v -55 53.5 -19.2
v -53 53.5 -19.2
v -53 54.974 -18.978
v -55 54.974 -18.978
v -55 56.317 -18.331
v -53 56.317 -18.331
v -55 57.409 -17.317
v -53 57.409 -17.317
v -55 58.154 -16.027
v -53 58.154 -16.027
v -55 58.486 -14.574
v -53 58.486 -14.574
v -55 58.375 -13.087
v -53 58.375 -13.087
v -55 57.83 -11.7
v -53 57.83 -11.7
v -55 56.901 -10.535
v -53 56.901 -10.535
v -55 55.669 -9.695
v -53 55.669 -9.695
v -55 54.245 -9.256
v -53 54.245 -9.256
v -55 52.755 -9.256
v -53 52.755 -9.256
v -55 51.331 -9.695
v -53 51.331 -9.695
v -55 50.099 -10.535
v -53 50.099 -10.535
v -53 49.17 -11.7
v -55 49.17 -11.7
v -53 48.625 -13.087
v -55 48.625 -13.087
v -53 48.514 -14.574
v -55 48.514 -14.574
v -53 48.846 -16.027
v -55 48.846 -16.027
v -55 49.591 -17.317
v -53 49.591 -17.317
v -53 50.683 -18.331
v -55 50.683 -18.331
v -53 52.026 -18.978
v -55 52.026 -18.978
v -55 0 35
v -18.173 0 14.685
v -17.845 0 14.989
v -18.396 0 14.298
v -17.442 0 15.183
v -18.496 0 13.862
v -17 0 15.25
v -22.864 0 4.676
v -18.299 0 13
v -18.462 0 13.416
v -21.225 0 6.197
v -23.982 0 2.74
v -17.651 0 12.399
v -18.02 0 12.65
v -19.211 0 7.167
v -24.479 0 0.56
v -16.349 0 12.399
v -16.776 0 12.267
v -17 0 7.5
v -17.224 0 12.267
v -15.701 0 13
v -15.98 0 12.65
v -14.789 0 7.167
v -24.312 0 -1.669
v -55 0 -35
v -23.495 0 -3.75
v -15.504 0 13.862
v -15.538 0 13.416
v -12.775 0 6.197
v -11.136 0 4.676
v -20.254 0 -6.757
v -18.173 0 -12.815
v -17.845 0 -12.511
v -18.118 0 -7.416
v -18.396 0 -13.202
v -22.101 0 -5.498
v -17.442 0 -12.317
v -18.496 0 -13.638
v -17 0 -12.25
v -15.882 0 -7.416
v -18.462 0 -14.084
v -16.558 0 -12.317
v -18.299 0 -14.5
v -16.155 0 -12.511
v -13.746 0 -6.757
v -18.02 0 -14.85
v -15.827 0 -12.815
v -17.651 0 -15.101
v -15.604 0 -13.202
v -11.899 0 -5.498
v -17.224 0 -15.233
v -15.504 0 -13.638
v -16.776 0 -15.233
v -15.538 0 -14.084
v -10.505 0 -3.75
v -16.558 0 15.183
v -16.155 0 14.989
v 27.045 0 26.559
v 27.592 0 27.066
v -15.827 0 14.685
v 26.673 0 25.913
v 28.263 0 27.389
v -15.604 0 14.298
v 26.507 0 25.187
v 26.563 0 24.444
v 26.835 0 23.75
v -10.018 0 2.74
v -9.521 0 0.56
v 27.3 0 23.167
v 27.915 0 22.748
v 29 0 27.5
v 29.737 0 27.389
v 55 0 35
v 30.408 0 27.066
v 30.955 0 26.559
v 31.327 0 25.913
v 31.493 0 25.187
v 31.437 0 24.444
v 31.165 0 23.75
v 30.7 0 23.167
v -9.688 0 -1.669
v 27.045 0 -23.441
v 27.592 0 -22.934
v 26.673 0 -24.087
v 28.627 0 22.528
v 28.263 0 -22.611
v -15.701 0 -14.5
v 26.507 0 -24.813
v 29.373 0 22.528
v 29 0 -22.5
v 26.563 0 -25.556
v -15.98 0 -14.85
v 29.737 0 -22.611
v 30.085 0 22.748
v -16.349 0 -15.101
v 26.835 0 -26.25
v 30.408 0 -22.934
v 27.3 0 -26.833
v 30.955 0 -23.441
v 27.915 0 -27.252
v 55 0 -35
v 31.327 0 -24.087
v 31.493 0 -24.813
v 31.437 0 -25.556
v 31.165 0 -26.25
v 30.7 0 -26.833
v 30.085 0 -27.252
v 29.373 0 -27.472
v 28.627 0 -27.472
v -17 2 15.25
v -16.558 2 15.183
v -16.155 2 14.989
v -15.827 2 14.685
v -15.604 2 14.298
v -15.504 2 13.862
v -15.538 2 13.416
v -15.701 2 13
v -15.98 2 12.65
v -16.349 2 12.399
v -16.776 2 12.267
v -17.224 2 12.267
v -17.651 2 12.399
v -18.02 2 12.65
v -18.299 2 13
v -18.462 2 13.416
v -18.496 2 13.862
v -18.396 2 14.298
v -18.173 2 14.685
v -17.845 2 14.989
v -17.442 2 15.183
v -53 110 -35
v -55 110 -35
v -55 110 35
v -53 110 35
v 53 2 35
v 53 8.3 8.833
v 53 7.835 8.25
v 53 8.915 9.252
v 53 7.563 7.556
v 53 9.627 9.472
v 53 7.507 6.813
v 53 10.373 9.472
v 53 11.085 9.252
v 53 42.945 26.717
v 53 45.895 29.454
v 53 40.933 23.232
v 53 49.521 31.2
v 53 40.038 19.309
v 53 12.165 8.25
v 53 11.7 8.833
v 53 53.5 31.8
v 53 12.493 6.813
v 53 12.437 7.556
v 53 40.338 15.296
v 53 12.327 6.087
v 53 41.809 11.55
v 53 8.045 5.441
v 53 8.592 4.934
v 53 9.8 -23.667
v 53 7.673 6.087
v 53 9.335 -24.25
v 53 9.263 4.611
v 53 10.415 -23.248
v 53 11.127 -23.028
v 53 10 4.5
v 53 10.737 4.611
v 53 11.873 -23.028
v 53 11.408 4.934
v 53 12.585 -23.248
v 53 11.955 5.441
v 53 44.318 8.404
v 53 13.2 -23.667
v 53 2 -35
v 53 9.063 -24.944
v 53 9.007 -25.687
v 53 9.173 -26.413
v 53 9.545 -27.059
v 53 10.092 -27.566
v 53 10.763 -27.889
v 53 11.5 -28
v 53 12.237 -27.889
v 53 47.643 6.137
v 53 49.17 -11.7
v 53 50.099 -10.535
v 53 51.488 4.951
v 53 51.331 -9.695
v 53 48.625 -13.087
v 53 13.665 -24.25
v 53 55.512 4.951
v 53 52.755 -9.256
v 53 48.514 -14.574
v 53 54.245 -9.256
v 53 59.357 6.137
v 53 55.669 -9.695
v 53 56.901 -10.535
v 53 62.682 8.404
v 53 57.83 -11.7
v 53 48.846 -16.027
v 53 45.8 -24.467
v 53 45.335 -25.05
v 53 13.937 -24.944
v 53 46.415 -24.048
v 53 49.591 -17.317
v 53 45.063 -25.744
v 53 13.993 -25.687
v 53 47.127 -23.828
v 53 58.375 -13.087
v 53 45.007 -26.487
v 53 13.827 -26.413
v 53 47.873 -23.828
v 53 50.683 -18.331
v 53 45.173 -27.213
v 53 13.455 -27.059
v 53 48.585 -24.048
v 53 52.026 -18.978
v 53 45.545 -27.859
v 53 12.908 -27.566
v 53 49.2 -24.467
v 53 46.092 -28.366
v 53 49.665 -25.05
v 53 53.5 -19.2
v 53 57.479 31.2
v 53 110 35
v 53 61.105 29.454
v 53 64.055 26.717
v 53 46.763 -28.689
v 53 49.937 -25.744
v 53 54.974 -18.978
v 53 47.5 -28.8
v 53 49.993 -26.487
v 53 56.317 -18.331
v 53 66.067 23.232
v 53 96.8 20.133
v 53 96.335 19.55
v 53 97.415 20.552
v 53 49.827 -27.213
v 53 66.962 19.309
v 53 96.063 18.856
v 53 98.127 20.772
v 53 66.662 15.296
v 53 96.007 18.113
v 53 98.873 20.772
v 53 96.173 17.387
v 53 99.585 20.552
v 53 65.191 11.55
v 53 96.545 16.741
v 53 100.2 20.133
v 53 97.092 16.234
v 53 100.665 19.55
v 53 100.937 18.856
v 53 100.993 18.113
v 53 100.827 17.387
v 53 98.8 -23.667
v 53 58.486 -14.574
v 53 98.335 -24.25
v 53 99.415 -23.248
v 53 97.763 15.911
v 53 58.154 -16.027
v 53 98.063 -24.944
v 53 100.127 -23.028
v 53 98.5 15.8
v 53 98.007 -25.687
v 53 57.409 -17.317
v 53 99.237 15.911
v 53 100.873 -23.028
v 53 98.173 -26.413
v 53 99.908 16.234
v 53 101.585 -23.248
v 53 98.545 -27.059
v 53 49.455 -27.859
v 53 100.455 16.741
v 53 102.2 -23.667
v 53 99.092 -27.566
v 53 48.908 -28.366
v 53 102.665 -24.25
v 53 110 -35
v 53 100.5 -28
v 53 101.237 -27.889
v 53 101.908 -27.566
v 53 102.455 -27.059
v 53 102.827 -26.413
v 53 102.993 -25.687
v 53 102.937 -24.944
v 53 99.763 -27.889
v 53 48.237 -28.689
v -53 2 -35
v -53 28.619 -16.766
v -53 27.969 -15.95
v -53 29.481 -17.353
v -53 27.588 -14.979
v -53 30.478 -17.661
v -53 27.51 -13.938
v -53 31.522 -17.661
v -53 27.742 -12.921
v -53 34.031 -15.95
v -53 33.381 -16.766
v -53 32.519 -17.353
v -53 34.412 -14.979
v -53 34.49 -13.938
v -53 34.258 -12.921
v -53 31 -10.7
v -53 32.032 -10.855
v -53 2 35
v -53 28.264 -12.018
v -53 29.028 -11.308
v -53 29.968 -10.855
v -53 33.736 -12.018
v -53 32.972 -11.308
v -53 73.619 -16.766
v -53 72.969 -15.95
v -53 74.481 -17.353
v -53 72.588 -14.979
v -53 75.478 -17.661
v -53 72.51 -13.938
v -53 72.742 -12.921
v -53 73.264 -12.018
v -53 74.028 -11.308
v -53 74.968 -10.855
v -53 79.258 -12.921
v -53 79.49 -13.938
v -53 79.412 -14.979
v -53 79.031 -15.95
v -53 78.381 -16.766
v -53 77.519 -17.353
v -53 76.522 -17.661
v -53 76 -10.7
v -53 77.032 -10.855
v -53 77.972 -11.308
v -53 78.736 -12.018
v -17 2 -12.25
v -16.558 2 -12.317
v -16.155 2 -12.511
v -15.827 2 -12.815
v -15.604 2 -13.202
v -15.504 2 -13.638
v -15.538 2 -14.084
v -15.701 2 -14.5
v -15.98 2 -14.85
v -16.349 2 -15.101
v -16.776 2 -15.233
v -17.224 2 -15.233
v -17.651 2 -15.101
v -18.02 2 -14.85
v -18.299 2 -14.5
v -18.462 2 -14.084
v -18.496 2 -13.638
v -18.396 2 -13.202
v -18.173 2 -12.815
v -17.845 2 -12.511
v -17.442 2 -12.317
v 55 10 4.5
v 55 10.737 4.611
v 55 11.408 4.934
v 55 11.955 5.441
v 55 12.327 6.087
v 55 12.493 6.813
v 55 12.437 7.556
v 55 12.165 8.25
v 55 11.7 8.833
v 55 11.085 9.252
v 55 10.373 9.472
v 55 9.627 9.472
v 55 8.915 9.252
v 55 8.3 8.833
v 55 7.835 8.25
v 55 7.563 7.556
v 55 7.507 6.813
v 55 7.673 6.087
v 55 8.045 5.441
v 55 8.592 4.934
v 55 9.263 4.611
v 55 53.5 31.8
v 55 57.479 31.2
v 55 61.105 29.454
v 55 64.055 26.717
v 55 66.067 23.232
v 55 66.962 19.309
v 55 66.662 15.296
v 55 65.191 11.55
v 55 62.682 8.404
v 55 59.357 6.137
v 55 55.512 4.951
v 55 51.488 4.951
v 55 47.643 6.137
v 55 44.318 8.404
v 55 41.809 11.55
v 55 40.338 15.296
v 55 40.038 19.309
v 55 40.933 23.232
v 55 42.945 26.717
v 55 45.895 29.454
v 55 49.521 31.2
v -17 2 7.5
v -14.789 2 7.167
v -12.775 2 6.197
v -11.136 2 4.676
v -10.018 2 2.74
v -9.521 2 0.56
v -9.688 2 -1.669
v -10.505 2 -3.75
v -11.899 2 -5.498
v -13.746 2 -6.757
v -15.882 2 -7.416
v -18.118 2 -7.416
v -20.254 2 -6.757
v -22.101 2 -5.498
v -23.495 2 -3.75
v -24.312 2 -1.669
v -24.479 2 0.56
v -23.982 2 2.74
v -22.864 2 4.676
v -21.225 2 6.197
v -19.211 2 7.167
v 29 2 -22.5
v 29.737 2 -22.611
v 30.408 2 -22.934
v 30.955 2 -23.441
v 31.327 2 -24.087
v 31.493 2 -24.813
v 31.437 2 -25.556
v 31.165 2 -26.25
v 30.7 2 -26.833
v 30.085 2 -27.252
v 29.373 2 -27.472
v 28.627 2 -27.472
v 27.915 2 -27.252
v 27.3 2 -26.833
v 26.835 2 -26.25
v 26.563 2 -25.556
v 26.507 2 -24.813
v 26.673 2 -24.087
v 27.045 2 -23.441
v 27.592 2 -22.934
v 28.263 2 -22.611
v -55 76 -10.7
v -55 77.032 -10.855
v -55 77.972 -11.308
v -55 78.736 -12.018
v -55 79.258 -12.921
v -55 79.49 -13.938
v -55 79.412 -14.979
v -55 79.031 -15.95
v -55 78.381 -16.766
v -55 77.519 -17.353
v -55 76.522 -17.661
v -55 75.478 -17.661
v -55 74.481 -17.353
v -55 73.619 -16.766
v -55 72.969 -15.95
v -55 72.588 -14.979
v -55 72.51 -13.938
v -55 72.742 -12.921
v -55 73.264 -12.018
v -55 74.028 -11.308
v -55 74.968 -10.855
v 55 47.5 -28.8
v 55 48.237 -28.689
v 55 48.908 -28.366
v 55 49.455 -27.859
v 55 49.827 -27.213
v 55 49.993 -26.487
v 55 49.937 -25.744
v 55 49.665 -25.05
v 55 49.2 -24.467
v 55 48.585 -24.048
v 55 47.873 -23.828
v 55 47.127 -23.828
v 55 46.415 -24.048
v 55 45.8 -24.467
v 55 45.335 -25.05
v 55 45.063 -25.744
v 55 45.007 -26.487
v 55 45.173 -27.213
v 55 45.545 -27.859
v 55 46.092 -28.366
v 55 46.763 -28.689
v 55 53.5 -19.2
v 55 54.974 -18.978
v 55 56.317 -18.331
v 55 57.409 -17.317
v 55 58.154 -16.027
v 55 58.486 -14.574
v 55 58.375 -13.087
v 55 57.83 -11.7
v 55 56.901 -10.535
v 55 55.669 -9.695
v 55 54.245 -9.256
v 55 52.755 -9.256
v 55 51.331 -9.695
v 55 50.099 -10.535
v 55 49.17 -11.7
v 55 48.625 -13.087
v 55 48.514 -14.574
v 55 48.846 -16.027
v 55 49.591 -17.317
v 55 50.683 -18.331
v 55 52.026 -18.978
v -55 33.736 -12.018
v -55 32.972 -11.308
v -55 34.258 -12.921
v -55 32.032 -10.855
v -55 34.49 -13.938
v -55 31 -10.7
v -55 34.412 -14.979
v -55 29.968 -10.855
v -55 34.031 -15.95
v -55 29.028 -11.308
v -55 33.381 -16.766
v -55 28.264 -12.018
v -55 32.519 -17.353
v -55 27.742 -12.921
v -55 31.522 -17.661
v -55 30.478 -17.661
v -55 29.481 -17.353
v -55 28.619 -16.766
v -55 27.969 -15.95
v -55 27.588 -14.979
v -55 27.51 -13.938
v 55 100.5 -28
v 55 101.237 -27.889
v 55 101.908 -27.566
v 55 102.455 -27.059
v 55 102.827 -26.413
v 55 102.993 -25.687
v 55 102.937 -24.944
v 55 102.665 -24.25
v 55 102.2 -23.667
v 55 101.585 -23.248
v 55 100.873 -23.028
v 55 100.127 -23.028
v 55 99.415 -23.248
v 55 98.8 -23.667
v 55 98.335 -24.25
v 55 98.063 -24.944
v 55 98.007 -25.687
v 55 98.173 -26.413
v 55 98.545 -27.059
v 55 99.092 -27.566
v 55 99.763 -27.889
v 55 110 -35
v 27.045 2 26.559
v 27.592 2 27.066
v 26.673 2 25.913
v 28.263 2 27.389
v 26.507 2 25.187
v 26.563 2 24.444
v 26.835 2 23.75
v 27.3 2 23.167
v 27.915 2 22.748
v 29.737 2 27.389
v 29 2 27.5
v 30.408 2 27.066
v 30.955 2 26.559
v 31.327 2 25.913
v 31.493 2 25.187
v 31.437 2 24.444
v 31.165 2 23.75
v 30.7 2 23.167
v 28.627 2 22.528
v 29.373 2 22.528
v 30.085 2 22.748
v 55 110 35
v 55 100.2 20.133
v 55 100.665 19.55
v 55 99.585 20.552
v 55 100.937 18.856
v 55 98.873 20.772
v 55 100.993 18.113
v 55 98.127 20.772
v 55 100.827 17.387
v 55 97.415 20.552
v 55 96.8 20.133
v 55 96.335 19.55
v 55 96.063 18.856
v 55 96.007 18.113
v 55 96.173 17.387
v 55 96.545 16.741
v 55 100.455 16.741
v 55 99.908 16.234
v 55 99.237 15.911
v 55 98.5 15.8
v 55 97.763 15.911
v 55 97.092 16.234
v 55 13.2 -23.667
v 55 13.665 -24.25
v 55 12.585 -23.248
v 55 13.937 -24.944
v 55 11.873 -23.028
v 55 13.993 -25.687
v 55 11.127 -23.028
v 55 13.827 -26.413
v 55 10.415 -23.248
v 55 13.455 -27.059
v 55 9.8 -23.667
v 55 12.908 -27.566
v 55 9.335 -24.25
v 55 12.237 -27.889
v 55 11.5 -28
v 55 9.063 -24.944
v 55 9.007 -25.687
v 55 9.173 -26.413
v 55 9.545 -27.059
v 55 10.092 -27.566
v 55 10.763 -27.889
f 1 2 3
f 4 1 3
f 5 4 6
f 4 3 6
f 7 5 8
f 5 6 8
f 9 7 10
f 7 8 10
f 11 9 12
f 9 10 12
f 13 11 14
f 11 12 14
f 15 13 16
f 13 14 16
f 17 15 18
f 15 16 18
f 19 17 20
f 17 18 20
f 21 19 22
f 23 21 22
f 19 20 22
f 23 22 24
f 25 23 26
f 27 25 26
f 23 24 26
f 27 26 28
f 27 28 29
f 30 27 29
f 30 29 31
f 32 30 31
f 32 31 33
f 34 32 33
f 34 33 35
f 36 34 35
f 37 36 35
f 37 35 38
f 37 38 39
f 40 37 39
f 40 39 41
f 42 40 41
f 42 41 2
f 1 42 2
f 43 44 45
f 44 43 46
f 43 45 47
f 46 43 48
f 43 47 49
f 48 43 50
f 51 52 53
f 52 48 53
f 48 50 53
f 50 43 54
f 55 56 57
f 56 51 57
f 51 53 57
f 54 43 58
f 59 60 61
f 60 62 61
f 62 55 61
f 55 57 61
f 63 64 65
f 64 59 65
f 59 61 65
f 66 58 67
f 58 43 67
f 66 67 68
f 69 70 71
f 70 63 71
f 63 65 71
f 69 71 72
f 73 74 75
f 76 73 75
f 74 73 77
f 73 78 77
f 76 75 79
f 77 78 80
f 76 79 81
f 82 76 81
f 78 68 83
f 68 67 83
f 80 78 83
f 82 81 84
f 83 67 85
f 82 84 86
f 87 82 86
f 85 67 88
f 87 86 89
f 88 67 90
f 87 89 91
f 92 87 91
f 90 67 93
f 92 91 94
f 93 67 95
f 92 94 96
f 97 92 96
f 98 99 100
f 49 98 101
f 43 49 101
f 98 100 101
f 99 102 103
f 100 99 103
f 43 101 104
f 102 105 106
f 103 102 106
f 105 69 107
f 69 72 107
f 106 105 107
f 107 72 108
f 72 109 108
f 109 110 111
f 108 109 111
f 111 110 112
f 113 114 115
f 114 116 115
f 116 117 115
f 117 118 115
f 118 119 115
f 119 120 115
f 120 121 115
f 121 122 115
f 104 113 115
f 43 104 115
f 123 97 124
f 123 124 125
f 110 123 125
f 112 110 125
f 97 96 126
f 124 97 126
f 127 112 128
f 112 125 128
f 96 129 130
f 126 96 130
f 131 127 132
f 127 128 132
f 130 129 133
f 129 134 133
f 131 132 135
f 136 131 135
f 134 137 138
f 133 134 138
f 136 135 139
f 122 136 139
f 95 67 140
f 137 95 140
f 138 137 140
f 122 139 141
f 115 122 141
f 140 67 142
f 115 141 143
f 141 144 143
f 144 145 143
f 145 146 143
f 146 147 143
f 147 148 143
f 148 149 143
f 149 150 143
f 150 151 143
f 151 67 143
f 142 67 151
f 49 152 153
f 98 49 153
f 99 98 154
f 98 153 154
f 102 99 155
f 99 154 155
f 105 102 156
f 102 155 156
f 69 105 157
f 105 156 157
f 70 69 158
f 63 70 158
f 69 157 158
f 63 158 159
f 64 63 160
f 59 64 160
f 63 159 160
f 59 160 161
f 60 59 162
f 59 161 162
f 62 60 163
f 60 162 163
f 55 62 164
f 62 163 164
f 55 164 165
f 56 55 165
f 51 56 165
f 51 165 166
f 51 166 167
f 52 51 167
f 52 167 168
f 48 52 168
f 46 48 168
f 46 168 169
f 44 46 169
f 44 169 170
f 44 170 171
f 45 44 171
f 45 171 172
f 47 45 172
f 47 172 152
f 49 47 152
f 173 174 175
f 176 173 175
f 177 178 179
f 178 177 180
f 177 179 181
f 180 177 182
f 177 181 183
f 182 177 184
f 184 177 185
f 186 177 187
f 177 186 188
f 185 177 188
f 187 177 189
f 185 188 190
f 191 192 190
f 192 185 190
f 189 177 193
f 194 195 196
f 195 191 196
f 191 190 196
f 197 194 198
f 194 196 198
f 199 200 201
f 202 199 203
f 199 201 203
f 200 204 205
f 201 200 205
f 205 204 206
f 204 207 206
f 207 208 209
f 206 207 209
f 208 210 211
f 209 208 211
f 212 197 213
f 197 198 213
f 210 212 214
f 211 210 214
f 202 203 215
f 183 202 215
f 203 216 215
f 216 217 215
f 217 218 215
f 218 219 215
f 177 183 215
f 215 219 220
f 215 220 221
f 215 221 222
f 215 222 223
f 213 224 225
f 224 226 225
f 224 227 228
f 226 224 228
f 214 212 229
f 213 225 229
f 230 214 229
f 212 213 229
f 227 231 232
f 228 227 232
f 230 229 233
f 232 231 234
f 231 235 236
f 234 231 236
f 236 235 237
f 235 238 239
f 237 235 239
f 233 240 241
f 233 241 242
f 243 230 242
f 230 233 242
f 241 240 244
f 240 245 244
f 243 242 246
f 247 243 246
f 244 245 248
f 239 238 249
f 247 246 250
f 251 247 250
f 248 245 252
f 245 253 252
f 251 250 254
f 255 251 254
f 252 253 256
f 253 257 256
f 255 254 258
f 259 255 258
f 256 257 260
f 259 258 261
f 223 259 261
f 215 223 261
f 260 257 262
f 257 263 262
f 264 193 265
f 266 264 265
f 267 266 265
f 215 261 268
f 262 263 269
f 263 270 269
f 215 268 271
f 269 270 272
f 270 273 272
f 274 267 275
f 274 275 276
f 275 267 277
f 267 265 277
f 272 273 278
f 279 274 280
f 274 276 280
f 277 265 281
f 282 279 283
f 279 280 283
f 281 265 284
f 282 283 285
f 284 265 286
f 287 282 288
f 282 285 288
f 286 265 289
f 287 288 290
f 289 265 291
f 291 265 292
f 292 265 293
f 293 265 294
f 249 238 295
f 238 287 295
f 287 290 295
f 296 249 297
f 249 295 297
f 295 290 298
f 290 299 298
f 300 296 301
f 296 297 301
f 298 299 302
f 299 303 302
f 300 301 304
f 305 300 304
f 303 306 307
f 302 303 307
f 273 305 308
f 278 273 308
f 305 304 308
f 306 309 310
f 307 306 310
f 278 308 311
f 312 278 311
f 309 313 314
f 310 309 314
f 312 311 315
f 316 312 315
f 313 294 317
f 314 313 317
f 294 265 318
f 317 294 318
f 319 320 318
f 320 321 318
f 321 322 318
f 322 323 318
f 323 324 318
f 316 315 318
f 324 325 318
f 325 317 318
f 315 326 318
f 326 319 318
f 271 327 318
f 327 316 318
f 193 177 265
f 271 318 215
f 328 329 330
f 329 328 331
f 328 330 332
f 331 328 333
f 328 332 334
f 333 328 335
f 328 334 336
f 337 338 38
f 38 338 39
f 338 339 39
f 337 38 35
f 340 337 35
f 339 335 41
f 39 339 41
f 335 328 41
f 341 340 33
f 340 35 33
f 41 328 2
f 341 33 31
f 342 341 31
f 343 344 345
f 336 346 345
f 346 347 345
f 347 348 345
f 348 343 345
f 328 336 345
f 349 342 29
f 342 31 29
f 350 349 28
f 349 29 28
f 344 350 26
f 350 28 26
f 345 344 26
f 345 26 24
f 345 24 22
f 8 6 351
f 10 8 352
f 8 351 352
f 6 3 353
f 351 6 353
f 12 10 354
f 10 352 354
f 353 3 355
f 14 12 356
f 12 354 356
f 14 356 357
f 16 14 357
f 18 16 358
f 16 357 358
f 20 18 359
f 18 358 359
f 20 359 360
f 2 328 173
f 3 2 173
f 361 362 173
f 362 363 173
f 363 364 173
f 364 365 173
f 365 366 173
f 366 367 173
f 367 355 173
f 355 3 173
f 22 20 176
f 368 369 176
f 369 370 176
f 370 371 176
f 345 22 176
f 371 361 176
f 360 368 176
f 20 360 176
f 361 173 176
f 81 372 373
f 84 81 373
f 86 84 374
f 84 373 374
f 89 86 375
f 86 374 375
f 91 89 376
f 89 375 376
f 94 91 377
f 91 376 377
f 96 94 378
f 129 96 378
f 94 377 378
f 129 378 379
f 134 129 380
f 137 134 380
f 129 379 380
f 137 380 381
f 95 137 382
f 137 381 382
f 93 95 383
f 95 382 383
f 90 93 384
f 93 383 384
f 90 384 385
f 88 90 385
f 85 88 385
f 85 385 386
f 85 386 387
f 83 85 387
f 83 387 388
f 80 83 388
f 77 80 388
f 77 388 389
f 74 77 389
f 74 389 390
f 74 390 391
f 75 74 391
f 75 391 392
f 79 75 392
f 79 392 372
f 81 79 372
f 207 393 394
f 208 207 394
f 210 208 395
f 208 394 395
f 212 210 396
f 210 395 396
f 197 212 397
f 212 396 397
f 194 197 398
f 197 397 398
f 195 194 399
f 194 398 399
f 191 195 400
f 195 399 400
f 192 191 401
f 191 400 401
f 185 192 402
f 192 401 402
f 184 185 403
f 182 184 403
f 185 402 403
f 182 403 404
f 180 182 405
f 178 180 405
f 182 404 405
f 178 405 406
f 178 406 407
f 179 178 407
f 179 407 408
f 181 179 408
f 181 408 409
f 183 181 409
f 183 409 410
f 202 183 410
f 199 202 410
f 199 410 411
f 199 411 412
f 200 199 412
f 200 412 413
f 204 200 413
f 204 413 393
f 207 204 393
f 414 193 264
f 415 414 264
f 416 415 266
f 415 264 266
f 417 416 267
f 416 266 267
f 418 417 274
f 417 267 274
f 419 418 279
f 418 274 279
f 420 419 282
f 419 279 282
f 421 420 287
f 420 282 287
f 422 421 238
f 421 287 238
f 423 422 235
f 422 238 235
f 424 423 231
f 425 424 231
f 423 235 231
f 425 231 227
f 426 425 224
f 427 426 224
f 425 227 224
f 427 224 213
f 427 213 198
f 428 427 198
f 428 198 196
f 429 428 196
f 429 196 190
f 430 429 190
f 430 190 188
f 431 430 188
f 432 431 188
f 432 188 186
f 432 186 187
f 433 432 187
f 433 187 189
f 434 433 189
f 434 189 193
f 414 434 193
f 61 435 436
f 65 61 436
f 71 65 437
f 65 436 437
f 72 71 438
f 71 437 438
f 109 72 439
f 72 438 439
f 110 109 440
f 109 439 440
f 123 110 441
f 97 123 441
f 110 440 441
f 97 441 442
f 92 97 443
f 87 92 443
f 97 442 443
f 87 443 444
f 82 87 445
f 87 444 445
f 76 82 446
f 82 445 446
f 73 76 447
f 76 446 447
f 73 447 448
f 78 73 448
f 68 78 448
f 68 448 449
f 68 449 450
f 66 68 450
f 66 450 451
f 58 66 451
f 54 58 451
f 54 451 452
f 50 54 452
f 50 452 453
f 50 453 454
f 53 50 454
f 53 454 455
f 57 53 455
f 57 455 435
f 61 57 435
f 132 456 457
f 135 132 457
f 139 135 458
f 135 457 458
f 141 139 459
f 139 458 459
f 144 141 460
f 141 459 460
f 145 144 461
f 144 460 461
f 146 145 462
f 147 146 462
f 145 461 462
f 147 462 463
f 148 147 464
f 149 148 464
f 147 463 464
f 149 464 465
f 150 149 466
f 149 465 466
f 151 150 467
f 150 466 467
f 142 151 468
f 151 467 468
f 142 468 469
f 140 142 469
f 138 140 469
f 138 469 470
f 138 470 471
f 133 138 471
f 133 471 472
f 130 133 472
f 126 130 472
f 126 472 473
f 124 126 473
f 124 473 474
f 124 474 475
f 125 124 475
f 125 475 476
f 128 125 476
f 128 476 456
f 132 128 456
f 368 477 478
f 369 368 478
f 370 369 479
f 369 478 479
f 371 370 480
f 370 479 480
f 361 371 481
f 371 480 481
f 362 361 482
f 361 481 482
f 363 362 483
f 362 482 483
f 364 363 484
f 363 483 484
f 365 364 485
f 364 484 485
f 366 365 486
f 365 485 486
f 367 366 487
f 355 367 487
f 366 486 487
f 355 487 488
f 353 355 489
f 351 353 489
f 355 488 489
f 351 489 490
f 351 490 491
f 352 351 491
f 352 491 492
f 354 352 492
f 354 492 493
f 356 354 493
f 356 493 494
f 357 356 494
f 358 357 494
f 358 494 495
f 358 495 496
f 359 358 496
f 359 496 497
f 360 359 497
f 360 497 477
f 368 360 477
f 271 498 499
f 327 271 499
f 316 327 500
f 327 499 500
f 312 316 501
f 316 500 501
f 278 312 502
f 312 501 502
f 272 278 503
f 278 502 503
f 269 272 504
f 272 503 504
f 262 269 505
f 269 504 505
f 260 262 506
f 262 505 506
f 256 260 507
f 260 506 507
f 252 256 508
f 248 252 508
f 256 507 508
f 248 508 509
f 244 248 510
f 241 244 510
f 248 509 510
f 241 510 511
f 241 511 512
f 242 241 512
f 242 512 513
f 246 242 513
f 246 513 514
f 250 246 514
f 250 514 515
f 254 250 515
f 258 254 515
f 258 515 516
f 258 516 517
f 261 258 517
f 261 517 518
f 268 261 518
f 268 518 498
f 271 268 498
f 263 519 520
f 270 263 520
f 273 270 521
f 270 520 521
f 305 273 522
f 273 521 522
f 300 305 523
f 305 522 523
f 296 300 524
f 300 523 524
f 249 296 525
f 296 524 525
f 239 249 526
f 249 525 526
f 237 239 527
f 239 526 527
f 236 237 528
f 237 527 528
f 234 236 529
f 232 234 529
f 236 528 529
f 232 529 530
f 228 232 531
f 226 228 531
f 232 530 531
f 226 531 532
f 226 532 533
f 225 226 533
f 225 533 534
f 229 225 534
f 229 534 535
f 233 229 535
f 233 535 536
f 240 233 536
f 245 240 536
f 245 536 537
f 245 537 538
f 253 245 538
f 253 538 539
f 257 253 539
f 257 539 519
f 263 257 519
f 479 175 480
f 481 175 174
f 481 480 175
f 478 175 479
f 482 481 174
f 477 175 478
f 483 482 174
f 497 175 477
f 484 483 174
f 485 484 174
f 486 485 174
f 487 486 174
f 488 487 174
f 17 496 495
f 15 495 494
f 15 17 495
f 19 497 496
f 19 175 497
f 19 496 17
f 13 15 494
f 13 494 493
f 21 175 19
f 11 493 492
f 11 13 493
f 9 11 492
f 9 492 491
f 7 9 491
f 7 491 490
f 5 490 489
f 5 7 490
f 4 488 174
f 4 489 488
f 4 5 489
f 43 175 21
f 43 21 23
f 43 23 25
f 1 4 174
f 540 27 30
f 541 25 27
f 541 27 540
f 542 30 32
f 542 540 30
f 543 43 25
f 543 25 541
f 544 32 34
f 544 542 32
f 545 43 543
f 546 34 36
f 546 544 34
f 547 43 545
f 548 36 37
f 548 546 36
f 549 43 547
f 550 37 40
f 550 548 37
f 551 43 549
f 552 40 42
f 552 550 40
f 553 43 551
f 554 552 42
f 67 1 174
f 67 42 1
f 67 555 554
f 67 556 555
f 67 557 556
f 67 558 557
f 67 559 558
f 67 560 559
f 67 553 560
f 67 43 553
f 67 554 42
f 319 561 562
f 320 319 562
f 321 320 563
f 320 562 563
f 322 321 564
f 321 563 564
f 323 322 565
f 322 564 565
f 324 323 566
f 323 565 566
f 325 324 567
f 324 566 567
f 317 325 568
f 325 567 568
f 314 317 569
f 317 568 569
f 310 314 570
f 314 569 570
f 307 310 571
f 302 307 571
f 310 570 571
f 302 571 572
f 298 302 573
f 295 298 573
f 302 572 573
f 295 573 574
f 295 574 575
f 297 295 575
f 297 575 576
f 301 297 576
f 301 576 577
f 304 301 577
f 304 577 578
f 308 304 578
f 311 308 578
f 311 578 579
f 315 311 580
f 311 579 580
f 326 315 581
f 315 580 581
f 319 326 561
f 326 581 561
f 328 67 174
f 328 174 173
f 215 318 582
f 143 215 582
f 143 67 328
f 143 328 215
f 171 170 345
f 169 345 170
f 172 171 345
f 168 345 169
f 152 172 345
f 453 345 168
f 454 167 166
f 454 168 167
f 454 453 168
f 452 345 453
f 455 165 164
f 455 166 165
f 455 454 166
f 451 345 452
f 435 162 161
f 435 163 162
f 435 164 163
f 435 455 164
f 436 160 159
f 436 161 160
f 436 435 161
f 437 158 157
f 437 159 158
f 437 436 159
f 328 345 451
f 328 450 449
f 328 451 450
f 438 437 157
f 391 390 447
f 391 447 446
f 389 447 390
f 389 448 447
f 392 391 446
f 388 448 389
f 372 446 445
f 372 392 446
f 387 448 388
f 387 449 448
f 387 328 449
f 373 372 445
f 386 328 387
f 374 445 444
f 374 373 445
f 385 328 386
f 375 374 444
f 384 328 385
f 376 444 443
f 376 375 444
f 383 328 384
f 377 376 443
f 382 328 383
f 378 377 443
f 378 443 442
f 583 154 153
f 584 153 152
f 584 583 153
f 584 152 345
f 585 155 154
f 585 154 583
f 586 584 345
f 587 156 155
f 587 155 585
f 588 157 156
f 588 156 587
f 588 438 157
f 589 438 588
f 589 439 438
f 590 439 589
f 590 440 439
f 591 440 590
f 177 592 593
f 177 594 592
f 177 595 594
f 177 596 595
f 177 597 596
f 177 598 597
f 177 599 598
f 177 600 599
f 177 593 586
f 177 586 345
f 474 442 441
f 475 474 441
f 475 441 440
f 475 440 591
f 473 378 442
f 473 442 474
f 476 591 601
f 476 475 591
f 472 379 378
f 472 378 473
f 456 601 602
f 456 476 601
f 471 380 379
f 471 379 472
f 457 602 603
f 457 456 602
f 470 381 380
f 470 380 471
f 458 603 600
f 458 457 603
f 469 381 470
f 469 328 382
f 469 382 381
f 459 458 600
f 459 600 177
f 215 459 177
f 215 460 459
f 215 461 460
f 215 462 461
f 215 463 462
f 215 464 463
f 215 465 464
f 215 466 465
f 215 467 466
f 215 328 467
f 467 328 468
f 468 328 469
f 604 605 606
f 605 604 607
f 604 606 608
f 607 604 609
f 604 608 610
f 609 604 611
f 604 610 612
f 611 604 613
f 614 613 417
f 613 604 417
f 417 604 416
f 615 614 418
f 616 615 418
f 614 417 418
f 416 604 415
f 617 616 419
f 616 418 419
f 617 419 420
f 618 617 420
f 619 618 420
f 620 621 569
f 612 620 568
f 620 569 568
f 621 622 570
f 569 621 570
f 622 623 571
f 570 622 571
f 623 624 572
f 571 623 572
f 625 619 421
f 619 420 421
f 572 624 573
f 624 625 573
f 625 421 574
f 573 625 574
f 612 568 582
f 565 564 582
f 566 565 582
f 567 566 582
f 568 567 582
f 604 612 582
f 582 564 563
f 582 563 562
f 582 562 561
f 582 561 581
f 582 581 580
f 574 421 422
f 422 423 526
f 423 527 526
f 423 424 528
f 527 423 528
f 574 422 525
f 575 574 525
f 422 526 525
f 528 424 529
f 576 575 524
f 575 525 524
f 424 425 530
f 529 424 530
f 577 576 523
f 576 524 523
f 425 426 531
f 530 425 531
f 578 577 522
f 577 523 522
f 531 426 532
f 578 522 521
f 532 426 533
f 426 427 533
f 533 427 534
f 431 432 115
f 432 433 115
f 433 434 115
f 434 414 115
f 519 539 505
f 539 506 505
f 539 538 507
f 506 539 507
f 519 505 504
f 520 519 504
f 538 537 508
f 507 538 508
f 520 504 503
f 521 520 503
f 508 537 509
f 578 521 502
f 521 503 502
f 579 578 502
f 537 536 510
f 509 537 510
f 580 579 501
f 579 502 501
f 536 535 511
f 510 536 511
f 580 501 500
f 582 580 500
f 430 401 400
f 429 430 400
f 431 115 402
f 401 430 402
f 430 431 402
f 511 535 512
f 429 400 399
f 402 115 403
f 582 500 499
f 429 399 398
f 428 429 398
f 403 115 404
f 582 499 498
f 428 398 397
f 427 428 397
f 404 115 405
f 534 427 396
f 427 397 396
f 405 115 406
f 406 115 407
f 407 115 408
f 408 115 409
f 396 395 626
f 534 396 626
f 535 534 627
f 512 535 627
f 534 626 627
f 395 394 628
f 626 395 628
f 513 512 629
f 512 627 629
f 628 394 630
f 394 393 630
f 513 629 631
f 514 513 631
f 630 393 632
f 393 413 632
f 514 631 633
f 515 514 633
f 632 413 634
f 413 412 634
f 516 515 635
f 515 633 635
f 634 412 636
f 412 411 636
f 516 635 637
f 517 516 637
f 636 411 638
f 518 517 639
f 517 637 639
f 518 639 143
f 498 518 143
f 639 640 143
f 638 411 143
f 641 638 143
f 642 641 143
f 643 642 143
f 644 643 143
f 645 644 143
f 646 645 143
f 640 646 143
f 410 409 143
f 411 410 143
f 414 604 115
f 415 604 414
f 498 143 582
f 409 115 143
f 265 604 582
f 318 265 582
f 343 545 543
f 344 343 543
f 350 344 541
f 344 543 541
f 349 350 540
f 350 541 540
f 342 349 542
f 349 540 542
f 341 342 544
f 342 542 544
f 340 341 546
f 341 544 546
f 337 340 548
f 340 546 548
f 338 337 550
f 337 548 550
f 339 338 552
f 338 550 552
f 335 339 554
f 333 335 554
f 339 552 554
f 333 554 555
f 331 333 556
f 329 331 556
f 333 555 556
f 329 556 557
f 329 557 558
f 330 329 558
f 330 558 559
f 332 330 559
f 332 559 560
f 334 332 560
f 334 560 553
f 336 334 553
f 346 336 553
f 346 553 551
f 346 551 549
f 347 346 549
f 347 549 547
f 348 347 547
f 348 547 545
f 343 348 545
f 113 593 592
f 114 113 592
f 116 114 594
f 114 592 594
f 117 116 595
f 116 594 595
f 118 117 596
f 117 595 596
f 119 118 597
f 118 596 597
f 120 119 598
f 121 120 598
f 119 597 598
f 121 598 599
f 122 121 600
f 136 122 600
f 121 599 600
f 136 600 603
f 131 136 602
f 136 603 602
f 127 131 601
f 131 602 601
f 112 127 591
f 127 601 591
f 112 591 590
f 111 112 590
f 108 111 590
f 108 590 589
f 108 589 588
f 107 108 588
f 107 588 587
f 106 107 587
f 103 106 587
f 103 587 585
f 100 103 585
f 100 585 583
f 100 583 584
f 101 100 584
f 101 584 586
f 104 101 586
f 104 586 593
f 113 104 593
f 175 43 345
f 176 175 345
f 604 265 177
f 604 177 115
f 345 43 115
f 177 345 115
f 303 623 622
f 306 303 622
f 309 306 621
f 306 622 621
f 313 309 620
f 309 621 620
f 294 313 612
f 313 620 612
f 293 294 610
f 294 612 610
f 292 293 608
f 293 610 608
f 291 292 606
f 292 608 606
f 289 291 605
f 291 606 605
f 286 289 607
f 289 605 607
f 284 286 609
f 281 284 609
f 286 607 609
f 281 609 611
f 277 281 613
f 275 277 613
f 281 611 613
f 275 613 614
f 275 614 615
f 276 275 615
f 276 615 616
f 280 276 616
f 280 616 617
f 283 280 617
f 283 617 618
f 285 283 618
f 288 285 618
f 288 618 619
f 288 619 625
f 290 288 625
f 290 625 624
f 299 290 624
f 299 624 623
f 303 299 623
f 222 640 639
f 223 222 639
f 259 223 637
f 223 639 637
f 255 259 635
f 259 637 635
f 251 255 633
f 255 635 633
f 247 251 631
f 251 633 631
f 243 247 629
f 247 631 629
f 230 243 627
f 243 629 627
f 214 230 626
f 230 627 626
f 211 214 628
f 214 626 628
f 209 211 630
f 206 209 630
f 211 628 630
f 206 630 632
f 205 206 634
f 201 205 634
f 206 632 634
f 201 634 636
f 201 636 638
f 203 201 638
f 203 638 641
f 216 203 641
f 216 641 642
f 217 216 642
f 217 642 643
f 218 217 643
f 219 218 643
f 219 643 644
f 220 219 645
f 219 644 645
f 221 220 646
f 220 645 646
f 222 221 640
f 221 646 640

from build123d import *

# Parameters (mm, degrees)
ESBO_O1_W                = 110
ESBO_O1_H                = 70
RESSALTO_EXTRUS_O1_DEPTH = 2
ESBO_O2_W                = 70
ESBO_O2_H                = 110
RESSALTO_EXTRUS_O2_DEPTH = 2
ESBO_O3_W                = 70
ESBO_O3_H                = 110
RESSALTO_EXTRUS_O3_DEPTH = 2
ESBO_O4_R                = 7.5
CORTE_EXTRUS_O1_DEPTH    = 6.35
ESBO_O5_R                = 2.5
CORTE_EXTRUS_O2_DEPTH    = 10
ESBO_O6_R                = 2.5
CORTE_EXTRUS_O3_DEPTH    = 10
ESBO_O7_R                = 13.5
ESBO_O7_R_2              = 1
CORTE_EXTRUS_O5_DEPTH    = 10
ESBO_O9_R                = 5
CORTE_EXTRUS_O6_DEPTH    = 160.452187191
ESBO_O10_R               = 2.5
CORTE_EXTRUS_O7_DEPTH    = 2
CORTE_EXTRUS_O11_REACH   = 128.151
ESBO_O18_R               = 2.5
ESBO_O19_R               = 1.5
CORTE_EXTRUS_O12_DEPTH   = 10
CORTE_EXTRUS_O13_REACH   = 161.452


with BuildPart() as part:
    # Esboço1 → Ressalto-extrusão1 (new body)
    with BuildSketch(Plane(origin=(0, 0, 0), x_dir=(1, 0, 0), z_dir=(0, 1, 0))):
        Rectangle(ESBO_O1_W, ESBO_O1_H)
    extrude(amount=RESSALTO_EXTRUS_O1_DEPTH)

    # Esboço2 → Ressalto-extrusão2 (add)
    with BuildSketch(Plane.ZY.offset(55)):
        with Locations((0, 55)):
            Rectangle(ESBO_O2_W, ESBO_O2_H)
    extrude(amount=-RESSALTO_EXTRUS_O2_DEPTH)

    # Esboço3 → Ressalto-extrusão3 (add)
    with BuildSketch(Plane(origin=(55, 0, 0), x_dir=(0, 0, -1), z_dir=(1, 0, 0))):
        with Locations((0, 55)):
            Rectangle(ESBO_O3_W, ESBO_O3_H)
    extrude(amount=-RESSALTO_EXTRUS_O3_DEPTH)

    # Esboço4 → Corte-extrusão1 (cut)
    with BuildSketch(Plane(origin=(0, 2, 0), x_dir=(1, 0, 0), z_dir=(0, 1, 0))):
        with Locations(Location((-17, 0, 0), (0, 0, 270))):
            Circle(ESBO_O4_R)
    extrude(amount=-CORTE_EXTRUS_O1_DEPTH, mode=Mode.SUBTRACT)

    # Esboço5 → Corte-extrusão2 (cut)
    with BuildSketch(Plane(origin=(55, 0, 0), x_dir=(0, 0, -1), z_dir=(1, 0, 0))):
        with Locations((-7, 10)):
            Circle(ESBO_O5_R)
    extrude(amount=-CORTE_EXTRUS_O2_DEPTH, mode=Mode.SUBTRACT)

    # Esboço6 → Corte-extrusão3 (cut)
    with BuildSketch(Plane(origin=(55, 0, 0), x_dir=(0, 0, -1), z_dir=(1, 0, 0))):
        with Locations((-18.3, 98.5)):
            Circle(ESBO_O6_R)
        with Locations((26.3, 47.5)):
            Circle(ESBO_O6_R)
    extrude(amount=-CORTE_EXTRUS_O3_DEPTH, mode=Mode.SUBTRACT)

    # Esboço7 → Corte-extrusão5 (cut)
    with BuildSketch(Plane.ZY.offset(-53)):
        with Locations((18.3, 53.5)):
            Circle(ESBO_O7_R)
        with Locations((18.3, 53.5)):
            Circle(ESBO_O7_R_2, mode=Mode.SUBTRACT)
        with Locations((18.3, 53.5)):
            Circle(ESBO_O7_R_2)
    extrude(amount=-CORTE_EXTRUS_O5_DEPTH, mode=Mode.SUBTRACT)

    # Esboço9 → Corte-extrusão6 (cut, through all)
    with BuildSketch(Plane(origin=(55, 0, 0), x_dir=(0, 0, -1), z_dir=(1, 0, 0))):
        with Locations((14.2, 53.5)):
            Circle(ESBO_O9_R)
    extrude(amount=-CORTE_EXTRUS_O6_DEPTH, mode=Mode.SUBTRACT)

    # Esboço10 → Corte-extrusão7 (cut)
    with BuildSketch(Plane(origin=(55, 0, 0), x_dir=(0, 0, -1), z_dir=(1, 0, 0))):
        with Locations((25.5, 11.5)):
            Circle(ESBO_O10_R)
        with Locations((25.5, 100.5)):
            Circle(ESBO_O10_R)
    extrude(amount=-CORTE_EXTRUS_O7_DEPTH, mode=Mode.SUBTRACT)

    # Esboço18 → Corte-extrusão11 (cut, up to next)
    with BuildSketch(Plane(origin=(0, 2, 0), x_dir=(1, 0, 0), z_dir=(0, 1, 0)), mode=Mode.PRIVATE) as corte_extrus_o11_sk1:
        with Locations(Location((29, 25, 0), (0, 0, 270))):
            Circle(ESBO_O18_R)
    corte_extrus_o11_tool1 = extrude(corte_extrus_o11_sk1.sketch, amount=-CORTE_EXTRUS_O11_REACH, mode=Mode.PRIVATE) & part.part
    # Esboço18 → Corte-extrusão11 (cut, up to next)
    with BuildSketch(Plane(origin=(0, 2, 0), x_dir=(1, 0, 0), z_dir=(0, 1, 0)), mode=Mode.PRIVATE) as corte_extrus_o11_sk2:
        with Locations(Location((29, -25, 0), (0, 0, 270))):
            Circle(ESBO_O18_R)
    corte_extrus_o11_tool2 = extrude(corte_extrus_o11_sk2.sketch, amount=-CORTE_EXTRUS_O11_REACH, mode=Mode.PRIVATE) & part.part
    add(corte_extrus_o11_tool1.solids().sort_by_distance((29, 2, -25))[0], mode=Mode.SUBTRACT)
    add(corte_extrus_o11_tool2.solids().sort_by_distance((29, 2, 25))[0], mode=Mode.SUBTRACT)

    # Esboço19 → Corte-extrusão12 (cut)
    with BuildSketch(Plane(origin=(0, 2, 0), x_dir=(1, 0, 0), z_dir=(0, 1, 0))):
        with Locations(Location((-17, 13.75, 0), (0, 0, 270))):
            Circle(ESBO_O19_R)
        with Locations(Location((-17, -13.75, 0), (0, 0, 270))):
            Circle(ESBO_O19_R)
    extrude(amount=-CORTE_EXTRUS_O12_DEPTH, mode=Mode.SUBTRACT)

    # Esboço20 → Corte-extrusão13 (cut, up to next)
    with BuildSketch(Plane.ZY.offset(55), mode=Mode.PRIVATE) as corte_extrus_o13_sk1:
        with BuildLine():
            ThreePointArc((-17.7, 31), (-14.2, 27.5), (-10.7, 31))
            ThreePointArc((-10.7, 31), (-14.2, 34.5), (-17.7, 31))
        make_face()
    corte_extrus_o13_tool1 = extrude(corte_extrus_o13_sk1.sketch, amount=-CORTE_EXTRUS_O13_REACH, mode=Mode.PRIVATE) & part.part
    # Esboço20 → Corte-extrusão13 (cut, up to next)
    with BuildSketch(Plane.ZY.offset(55), mode=Mode.PRIVATE) as corte_extrus_o13_sk2:
        with BuildLine():
            ThreePointArc((-17.7, 76), (-14.2, 72.5), (-10.7, 76))
            ThreePointArc((-10.7, 76), (-14.2, 79.5), (-17.7, 76))
        make_face()
    corte_extrus_o13_tool2 = extrude(corte_extrus_o13_sk2.sketch, amount=-CORTE_EXTRUS_O13_REACH, mode=Mode.PRIVATE) & part.part
    add(corte_extrus_o13_tool1.solids().sort_by_distance((-55, 31, -14.2))[0], mode=Mode.SUBTRACT)
    add(corte_extrus_o13_tool2.solids().sort_by_distance((-55, 76, -14.2))[0], mode=Mode.SUBTRACT)


solid = part.part
